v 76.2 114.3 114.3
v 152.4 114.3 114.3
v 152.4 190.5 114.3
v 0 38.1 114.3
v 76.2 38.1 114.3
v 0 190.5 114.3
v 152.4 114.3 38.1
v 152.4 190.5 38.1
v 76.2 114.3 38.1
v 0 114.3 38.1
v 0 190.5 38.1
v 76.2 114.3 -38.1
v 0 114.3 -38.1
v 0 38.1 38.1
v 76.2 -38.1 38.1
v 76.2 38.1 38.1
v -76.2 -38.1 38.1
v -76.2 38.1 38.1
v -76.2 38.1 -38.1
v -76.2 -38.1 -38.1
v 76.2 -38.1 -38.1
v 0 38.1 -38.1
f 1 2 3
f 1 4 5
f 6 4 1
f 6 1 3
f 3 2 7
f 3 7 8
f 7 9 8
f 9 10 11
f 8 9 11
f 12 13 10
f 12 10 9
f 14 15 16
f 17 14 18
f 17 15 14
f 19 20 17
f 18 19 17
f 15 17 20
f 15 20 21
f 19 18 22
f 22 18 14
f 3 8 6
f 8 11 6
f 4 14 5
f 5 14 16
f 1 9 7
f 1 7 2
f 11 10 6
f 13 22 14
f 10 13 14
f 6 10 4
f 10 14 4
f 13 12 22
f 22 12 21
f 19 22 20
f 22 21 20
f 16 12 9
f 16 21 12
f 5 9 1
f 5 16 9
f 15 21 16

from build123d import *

# Parameters (mm, degrees)
F1_W      = 152.4
F1_H      = 76.2
F2_DEPTH  = 38.1
F3_W      = 76.2
F3_H      = 76.2
F4_DEPTH  = 76.2
F5_W      = 76.2
F5_H      = 76.2
F6_DEPTH  = 76.2
F7_W      = 76.2
F7_H      = 76.2
F8_DEPTH  = 76.2
F9_W      = 76.2
F9_H      = 76.2
F10_DEPTH = 76.2


# Not quite as in the source:
# - a variable given as a bare number and used for a length is read in inches; the dataset says mm whatever the document's units were


with BuildPart() as f2:
    # F1 (on Front) → F2 (new body, symmetric)
    with BuildSketch(Plane.XZ):
        Rectangle(F1_W, F1_H)
    extrude(amount=F2_DEPTH, both=True)

    # F3 (on face) → F4 (join)
    with BuildSketch(Plane(origin=(0, 38.1, 0), x_dir=(-1, 0, 0), z_dir=(0, 1, 0))):
        with Locations((-38.1, 0)):
            Rectangle(F3_W, F3_H)
    extrude(amount=F4_DEPTH)

    # F5 (on face) → F6 (join)
    with BuildSketch(Plane.XY.offset(38.1)):
        with Locations((38.1, 76.2)):
            Rectangle(F5_W, F5_H)
    extrude(amount=F6_DEPTH)

    # F7 (on face) → F8 (join)
    with BuildSketch(Plane(origin=(0, 114.3, 0), x_dir=(-1, 0, 0), z_dir=(0, 1, 0))):
        with Locations((-38.1, 76.2)):
            Rectangle(F7_W, F7_H)
    extrude(amount=F8_DEPTH)

    # F9 (on face) → F10 (join)
    with BuildSketch(Plane.YZ.offset(76.2)):
        with Locations((152.4, 76.2)):
            Rectangle(F9_W, F9_H)
    extrude(amount=F10_DEPTH)


solid = f2.part
